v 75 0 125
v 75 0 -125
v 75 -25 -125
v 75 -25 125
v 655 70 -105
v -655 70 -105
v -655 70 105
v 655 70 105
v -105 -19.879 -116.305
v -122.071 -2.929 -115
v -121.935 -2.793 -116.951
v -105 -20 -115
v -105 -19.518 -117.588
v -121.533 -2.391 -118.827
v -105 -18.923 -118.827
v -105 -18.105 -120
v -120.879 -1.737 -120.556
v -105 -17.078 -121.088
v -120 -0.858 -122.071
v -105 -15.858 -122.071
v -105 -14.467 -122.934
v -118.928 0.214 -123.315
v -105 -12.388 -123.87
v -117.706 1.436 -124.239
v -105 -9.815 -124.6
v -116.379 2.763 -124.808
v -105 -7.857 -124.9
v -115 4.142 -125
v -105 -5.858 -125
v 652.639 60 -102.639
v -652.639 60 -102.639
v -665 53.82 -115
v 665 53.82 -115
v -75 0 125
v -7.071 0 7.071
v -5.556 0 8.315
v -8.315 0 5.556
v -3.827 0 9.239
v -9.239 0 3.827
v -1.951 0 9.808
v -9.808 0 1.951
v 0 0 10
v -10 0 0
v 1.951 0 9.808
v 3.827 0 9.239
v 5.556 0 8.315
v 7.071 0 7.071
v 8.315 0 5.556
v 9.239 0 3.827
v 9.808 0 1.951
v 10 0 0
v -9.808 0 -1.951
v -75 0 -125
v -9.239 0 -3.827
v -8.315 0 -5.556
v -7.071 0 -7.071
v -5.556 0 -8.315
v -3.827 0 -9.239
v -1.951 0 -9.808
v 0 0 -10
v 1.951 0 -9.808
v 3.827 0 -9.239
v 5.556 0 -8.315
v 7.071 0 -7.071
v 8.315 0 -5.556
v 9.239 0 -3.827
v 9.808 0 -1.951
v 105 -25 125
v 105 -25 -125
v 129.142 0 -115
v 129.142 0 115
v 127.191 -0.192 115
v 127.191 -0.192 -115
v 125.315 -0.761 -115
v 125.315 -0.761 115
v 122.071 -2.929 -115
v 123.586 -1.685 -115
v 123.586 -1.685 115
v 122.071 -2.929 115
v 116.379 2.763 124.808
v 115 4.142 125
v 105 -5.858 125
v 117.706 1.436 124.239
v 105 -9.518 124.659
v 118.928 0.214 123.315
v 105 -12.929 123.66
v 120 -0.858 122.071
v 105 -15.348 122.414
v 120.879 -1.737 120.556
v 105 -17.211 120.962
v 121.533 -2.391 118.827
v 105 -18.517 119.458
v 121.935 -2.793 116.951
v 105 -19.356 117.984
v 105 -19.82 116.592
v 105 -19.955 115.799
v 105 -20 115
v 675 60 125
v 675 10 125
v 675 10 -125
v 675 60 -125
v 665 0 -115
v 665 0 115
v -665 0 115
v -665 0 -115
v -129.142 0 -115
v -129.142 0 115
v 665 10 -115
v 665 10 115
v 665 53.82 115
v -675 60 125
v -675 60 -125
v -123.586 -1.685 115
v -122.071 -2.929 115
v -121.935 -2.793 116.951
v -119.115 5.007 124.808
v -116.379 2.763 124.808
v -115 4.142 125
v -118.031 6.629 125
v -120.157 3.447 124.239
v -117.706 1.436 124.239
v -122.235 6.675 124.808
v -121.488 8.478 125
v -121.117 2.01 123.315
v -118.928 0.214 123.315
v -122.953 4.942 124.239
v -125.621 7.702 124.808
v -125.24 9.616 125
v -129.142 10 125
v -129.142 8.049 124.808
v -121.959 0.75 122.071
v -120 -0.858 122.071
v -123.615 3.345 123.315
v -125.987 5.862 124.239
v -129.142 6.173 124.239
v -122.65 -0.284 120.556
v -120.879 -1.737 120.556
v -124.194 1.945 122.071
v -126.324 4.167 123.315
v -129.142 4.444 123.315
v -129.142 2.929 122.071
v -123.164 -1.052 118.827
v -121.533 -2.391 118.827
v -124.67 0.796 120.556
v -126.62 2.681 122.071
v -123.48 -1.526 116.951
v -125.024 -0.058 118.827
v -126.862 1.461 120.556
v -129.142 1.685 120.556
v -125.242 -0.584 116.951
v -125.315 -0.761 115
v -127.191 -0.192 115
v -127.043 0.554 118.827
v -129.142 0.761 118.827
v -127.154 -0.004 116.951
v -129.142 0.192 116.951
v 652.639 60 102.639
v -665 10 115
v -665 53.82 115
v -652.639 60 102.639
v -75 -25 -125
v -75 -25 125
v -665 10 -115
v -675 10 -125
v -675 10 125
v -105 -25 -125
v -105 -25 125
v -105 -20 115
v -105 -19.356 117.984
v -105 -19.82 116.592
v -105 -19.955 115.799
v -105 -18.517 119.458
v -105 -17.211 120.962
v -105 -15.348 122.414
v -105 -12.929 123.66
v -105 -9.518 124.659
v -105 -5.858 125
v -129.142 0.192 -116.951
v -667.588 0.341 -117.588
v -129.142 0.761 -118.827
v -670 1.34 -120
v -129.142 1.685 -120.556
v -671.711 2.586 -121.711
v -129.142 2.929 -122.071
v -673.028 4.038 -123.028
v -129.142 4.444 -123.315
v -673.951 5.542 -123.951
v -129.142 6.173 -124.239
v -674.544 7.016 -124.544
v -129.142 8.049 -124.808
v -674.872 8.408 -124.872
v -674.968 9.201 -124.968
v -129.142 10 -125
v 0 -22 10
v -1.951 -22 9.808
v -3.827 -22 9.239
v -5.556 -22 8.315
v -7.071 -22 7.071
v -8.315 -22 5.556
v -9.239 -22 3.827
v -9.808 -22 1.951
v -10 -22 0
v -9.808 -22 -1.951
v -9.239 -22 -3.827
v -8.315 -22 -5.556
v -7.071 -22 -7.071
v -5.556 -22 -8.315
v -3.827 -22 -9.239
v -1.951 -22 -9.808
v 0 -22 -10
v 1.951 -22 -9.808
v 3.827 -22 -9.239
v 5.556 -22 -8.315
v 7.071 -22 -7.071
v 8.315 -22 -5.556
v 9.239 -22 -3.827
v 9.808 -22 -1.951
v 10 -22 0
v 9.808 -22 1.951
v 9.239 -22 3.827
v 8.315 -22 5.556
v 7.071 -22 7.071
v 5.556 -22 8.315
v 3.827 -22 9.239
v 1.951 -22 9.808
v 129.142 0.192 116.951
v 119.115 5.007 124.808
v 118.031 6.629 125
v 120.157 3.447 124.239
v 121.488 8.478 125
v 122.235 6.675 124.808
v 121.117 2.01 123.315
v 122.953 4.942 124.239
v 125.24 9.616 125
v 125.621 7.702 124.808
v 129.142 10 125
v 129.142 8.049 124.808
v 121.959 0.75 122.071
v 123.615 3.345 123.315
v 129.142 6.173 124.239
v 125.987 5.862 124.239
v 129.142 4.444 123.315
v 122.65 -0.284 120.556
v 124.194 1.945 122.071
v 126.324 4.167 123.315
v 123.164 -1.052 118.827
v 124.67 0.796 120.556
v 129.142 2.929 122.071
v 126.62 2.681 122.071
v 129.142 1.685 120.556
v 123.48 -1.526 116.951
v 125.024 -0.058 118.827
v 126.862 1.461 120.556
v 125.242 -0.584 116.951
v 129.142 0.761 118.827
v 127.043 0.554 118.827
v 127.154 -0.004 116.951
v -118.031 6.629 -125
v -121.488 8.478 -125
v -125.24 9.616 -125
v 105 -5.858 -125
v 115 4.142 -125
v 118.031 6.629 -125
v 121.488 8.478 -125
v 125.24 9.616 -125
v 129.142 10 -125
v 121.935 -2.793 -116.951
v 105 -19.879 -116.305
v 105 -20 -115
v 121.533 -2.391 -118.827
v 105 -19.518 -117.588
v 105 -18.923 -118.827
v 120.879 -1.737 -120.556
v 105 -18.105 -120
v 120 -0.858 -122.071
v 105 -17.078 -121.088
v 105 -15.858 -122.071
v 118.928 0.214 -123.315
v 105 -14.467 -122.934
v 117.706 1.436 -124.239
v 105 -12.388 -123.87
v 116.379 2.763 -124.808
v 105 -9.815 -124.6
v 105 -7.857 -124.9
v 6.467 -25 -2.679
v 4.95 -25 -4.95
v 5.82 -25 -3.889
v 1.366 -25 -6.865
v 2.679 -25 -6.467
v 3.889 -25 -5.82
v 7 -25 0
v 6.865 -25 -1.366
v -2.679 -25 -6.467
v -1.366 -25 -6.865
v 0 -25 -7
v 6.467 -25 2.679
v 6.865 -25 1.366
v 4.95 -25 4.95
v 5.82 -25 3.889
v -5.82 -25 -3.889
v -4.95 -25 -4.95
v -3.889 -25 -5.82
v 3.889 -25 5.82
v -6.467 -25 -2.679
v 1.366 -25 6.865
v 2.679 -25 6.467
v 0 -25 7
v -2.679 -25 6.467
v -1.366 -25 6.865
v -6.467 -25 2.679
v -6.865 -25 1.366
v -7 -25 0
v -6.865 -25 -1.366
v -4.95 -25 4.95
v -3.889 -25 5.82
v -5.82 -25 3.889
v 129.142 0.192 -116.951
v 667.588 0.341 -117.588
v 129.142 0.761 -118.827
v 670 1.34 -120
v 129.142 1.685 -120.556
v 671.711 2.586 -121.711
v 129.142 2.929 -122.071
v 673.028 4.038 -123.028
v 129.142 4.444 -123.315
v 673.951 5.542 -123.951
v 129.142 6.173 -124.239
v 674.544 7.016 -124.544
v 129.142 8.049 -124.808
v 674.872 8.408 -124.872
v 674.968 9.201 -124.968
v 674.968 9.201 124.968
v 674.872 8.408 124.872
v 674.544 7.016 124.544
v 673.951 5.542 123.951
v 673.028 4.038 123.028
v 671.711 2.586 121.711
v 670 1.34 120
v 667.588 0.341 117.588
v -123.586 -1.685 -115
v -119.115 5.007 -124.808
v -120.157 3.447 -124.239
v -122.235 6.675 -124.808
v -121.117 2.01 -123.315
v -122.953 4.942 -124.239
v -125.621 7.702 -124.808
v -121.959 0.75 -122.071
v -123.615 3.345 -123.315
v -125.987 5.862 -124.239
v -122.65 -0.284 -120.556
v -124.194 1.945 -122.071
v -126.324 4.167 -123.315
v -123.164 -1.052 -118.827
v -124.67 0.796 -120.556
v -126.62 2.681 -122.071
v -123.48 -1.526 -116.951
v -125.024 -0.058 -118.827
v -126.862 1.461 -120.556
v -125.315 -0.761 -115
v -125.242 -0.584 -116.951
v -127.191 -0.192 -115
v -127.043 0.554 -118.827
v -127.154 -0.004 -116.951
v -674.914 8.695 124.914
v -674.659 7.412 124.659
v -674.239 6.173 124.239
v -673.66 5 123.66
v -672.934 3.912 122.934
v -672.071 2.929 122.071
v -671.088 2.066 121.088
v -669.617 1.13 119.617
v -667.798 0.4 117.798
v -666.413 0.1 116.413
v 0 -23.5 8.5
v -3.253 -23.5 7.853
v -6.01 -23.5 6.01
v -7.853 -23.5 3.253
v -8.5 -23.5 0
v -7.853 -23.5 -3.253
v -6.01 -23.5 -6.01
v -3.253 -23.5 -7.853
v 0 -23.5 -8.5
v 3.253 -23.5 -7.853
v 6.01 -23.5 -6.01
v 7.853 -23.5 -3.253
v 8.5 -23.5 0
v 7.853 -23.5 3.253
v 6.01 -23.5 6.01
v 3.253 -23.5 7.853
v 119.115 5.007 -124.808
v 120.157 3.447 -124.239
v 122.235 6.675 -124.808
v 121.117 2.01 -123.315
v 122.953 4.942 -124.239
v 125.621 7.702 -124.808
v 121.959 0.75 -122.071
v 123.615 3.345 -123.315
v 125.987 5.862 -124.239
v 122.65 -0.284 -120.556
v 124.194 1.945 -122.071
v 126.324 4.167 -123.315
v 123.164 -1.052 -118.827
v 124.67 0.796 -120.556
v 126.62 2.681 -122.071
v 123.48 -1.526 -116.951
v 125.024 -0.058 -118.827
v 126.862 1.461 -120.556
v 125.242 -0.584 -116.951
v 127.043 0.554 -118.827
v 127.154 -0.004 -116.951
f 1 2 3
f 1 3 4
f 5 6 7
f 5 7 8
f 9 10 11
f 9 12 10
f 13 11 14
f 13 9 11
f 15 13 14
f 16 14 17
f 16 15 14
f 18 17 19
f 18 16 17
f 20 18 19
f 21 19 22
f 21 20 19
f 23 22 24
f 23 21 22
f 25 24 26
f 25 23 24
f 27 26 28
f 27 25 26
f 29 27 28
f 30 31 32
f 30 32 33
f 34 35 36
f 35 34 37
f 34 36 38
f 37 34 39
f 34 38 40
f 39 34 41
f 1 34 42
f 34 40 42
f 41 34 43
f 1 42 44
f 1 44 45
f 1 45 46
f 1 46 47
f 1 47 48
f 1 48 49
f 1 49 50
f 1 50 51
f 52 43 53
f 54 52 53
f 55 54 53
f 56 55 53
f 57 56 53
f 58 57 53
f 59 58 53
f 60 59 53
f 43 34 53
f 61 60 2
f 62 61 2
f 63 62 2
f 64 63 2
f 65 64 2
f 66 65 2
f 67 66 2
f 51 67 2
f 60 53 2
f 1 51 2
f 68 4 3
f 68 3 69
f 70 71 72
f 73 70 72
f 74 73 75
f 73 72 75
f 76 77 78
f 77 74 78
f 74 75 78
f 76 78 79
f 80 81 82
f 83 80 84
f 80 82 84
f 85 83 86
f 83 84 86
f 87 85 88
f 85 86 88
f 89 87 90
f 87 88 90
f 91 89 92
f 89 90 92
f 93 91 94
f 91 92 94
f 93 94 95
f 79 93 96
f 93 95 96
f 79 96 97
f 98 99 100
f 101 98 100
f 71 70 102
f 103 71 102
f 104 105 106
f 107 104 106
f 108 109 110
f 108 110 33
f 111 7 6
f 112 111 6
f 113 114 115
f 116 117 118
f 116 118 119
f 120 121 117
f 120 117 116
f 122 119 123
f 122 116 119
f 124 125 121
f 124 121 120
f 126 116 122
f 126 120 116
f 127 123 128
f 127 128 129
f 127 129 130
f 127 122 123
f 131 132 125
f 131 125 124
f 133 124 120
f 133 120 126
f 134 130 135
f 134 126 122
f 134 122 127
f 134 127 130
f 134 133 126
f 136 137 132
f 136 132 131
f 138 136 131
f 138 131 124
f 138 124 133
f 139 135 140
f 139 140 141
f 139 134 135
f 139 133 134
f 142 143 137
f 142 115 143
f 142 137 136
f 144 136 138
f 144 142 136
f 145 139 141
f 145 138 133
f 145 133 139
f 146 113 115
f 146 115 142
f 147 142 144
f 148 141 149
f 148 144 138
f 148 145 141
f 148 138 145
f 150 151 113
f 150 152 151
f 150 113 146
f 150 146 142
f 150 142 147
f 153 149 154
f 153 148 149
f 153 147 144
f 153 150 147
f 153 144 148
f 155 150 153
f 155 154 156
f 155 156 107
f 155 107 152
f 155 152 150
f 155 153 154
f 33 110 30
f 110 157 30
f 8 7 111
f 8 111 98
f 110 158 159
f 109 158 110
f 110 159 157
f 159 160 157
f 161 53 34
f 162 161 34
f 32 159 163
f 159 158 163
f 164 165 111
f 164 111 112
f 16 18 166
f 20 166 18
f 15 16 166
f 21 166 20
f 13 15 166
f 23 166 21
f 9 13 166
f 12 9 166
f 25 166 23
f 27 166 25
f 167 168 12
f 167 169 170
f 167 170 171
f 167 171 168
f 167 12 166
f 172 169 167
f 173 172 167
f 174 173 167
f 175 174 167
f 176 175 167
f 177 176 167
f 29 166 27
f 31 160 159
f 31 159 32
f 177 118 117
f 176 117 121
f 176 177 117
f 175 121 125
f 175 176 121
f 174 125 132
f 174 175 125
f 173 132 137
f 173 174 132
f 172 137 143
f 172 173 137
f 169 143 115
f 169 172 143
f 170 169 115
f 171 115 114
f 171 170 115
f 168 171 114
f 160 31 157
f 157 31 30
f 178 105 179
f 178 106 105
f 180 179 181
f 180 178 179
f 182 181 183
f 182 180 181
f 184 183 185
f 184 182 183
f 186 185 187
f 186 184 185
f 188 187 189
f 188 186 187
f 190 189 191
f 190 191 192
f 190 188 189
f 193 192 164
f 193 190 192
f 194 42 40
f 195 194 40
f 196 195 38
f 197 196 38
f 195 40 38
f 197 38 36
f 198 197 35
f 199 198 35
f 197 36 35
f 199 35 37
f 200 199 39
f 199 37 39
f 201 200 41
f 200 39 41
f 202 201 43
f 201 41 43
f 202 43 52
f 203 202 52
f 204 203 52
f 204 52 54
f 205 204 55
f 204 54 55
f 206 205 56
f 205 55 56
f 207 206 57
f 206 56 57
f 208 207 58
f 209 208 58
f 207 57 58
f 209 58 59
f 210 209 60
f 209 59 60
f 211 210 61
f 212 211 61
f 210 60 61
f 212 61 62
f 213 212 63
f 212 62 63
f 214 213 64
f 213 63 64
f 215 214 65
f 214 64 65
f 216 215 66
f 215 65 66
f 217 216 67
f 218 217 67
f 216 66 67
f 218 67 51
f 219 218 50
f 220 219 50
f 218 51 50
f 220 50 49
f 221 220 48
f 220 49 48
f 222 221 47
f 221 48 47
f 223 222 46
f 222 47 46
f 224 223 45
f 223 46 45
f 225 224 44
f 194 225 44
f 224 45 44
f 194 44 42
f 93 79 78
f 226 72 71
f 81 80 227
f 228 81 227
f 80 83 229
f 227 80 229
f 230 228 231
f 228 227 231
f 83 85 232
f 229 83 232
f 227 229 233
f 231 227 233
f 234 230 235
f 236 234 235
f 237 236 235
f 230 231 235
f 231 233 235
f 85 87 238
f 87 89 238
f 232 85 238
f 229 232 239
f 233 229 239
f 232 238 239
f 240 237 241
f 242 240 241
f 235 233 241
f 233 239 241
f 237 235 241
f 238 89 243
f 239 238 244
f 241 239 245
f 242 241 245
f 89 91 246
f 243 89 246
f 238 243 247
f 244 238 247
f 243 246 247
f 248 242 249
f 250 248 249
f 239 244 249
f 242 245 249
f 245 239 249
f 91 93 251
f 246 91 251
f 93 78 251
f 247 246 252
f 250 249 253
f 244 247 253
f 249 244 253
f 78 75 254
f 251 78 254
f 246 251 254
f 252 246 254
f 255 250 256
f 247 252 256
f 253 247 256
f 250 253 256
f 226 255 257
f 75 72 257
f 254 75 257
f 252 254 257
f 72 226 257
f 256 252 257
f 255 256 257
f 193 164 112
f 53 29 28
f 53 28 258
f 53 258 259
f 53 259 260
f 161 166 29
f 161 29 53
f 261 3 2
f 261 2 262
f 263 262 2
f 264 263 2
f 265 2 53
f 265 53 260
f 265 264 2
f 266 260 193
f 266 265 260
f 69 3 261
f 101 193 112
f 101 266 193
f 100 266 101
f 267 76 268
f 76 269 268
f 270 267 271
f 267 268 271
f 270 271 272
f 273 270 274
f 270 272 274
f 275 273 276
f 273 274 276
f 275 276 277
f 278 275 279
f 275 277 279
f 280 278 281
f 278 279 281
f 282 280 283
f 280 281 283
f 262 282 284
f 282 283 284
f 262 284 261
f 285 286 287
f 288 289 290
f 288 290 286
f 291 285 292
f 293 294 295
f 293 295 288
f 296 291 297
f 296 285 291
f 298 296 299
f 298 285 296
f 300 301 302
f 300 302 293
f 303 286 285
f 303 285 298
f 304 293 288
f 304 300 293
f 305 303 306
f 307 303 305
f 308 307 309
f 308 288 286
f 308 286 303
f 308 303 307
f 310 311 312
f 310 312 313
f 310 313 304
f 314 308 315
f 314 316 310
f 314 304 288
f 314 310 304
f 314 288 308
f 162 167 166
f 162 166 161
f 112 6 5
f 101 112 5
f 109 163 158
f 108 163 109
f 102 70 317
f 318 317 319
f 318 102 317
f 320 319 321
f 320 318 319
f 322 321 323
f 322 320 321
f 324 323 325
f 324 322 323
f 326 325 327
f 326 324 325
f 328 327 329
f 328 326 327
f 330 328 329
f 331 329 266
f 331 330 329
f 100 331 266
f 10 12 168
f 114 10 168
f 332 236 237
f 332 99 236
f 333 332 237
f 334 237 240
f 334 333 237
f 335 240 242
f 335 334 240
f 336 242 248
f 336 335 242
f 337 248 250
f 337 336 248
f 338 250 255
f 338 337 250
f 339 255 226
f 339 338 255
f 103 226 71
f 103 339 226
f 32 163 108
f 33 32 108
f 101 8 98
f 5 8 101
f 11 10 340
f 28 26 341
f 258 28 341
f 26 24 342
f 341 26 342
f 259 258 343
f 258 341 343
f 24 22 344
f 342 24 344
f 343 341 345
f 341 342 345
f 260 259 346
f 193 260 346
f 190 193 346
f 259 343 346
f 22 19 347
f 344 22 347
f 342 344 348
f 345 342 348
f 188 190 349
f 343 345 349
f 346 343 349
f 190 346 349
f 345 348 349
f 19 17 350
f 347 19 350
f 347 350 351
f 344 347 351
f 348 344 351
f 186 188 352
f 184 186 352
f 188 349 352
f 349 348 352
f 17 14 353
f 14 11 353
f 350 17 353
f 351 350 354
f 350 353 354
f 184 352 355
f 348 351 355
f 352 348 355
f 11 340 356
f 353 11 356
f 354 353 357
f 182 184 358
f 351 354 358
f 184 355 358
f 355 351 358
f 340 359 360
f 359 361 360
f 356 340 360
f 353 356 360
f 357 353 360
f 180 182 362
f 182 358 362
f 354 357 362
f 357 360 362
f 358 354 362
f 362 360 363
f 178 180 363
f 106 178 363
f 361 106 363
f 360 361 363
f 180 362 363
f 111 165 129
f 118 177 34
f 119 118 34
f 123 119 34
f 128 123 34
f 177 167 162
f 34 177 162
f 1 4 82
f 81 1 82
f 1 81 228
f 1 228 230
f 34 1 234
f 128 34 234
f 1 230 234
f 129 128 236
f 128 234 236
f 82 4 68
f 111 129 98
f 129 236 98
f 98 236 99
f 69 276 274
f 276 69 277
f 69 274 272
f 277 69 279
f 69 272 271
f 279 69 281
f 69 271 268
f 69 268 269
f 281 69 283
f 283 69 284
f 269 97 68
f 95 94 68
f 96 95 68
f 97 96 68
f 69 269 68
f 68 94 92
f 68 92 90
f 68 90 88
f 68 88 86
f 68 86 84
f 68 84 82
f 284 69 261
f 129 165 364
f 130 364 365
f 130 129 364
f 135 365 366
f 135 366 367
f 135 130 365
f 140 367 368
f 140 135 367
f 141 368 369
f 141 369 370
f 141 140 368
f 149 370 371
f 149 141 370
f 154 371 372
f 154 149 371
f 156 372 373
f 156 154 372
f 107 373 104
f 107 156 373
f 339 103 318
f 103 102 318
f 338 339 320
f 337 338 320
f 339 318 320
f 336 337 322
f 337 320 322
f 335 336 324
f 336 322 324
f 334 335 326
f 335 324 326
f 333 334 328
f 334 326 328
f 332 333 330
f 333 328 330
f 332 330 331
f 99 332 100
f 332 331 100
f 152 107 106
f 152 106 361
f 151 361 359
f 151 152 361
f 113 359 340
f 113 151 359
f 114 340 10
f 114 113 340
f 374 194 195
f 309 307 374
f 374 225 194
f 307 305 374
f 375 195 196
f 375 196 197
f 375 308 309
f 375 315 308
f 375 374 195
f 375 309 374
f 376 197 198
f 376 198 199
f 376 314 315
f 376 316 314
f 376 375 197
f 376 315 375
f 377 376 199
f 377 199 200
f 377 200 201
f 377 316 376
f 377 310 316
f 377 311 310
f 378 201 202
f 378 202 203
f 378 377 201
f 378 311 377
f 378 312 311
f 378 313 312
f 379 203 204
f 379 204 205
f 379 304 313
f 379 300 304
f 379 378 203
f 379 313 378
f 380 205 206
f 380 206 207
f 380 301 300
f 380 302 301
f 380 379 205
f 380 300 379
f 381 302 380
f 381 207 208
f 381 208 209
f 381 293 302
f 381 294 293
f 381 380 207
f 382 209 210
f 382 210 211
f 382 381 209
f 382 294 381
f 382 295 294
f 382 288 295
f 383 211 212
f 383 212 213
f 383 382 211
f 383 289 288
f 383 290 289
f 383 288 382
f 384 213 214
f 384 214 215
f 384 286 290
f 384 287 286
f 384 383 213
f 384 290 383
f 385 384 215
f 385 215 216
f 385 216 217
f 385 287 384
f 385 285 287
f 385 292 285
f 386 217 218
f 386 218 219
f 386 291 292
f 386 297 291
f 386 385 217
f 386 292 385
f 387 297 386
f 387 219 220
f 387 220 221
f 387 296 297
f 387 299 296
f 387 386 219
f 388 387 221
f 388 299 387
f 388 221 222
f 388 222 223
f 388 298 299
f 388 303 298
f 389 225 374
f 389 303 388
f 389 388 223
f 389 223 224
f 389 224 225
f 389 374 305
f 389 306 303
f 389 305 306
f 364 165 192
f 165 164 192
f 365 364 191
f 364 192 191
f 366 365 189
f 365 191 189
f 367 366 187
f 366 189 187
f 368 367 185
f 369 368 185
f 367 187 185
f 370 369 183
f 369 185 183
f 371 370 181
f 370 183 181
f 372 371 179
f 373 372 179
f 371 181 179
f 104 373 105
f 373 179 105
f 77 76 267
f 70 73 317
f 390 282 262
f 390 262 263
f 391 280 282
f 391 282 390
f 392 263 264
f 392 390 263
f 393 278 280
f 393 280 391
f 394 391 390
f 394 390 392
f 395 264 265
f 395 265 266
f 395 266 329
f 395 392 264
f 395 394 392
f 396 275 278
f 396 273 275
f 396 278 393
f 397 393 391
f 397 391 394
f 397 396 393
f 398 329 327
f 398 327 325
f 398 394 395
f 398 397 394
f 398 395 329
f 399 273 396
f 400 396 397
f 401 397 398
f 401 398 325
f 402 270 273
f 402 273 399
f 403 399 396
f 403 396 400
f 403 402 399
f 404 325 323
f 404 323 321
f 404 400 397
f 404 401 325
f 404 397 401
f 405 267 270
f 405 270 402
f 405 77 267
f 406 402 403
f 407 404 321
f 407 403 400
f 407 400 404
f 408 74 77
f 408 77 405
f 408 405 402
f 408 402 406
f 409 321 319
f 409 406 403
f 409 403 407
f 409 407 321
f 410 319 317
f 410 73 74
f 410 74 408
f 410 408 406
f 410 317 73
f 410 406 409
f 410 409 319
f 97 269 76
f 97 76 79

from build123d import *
from OCP.BRepFilletAPI import BRepFilletAPI_MakeChamfer

# Parameters (mm, degrees)
SKETCH1_W           = 1350
SKETCH1_H           = 250
BOSS_EXTRUDE1_DEPTH = 70
CHAMFER1_SIZE       = 10
CHAMFER1_SIZE2      = 20
SHELL1_T            = 10
SKETCH2_W           = 30
SKETCH2_H           = 250
BOSS_EXTRUDE2_DEPTH = 25
CHAMFER2_SIZE       = 20
FILLET1_R           = 10
SKETCH3_R           = 10
BOSS_EXTRUDE3_DEPTH = 25
CHAMFER3_SIZE       = 3


with BuildPart() as part:
    # Sketch1 → Boss-Extrude1 (new body)
    with BuildSketch(Plane(origin=(0, 0, 0), x_dir=(1, 0, 0), z_dir=(0, 1, 0))):
        Rectangle(SKETCH1_W, SKETCH1_H)
    extrude(amount=BOSS_EXTRUDE1_DEPTH)

    # Chamfer1: one chamfer whose edges measure the first distance from different faces: ONE call of the kernel's chamfer builder (chamfer() names one face for all edges)
    chamfer1_edges_1 = [part.edges().sort_by_distance(p)[0] for p in [
        (675, 70, 0),
    ]]
    chamfer1_side_1 = [part.faces().sort_by_distance(p)[0] for p in [
        (675, 35, 0),
    ]]
    chamfer1_edges_2 = [part.edges().sort_by_distance(p)[0] for p in [
        (0, 70, -125),
    ]]
    chamfer1_side_2 = [part.faces().sort_by_distance(p)[0] for p in [
        (0, 35, -125),
    ]]
    chamfer1_edges_3 = [part.edges().sort_by_distance(p)[0] for p in [
        (-675, 70, 0),
    ]]
    chamfer1_side_3 = [part.faces().sort_by_distance(p)[0] for p in [
        (-675, 35, 0),
    ]]
    chamfer1_edges_4 = [part.edges().sort_by_distance(p)[0] for p in [
        (0, 70, 125),
    ]]
    chamfer1_side_4 = [part.faces().sort_by_distance(p)[0] for p in [
        (0, 35, 125),
    ]]
    chamfer1 = BRepFilletAPI_MakeChamfer(part.part.solid().wrapped)
    for e in chamfer1_edges_1:
        chamfer1.Add(CHAMFER1_SIZE, CHAMFER1_SIZE2, e.wrapped, chamfer1_side_1[0].wrapped)  # the first distance lies on this face
    for e in chamfer1_edges_2:
        chamfer1.Add(CHAMFER1_SIZE, CHAMFER1_SIZE2, e.wrapped, chamfer1_side_2[0].wrapped)  # the first distance lies on this face
    for e in chamfer1_edges_3:
        chamfer1.Add(CHAMFER1_SIZE, CHAMFER1_SIZE2, e.wrapped, chamfer1_side_3[0].wrapped)  # the first distance lies on this face
    for e in chamfer1_edges_4:
        chamfer1.Add(CHAMFER1_SIZE, CHAMFER1_SIZE2, e.wrapped, chamfer1_side_4[0].wrapped)  # the first distance lies on this face
    add(Compound.cast(chamfer1.Shape()), mode=Mode.REPLACE)

    # Shell1 (no face opened: a closed hollow body)
    add(offset(amount=-SHELL1_T, mode=Mode.PRIVATE), mode=Mode.SUBTRACT)

    # Sketch2 → Boss-Extrude2 (add)
    with BuildSketch(Plane.XZ):
        with Locations((-90, 0)):
            Rectangle(SKETCH2_W, SKETCH2_H)
        with Locations((90, 0)):
            Rectangle(SKETCH2_W, SKETCH2_H)
    extrude(amount=BOSS_EXTRUDE2_DEPTH)

    # Chamfer2
    chamfer2_edges = [part.edges().sort_by_distance(p)[0] for p in [
        (-105, 0, 0),
        (105, 0, 0),
    ]]
    chamfer(chamfer2_edges, length=CHAMFER2_SIZE)

    # Fillet1
    fillet1_edges = [part.edges().sort_by_distance(p)[0] for p in [
        (-400, 0, -125),
        (675, 0, 0),
        (-400, 0, 125),
        (-675, 0, 0),
        (-125, 0, 0),
        (400, 0, -125),
        (400, 0, 125),
        (125, 0, 0),
        (-115, -10, -125),
        (-115, -10, 125),
        (115, -10, 125),
        (115, -10, -125),
    ]]
    fillet(fillet1_edges, radius=FILLET1_R)

    # Sketch3 → Boss-Extrude3 (add)
    with BuildSketch(Plane.XZ):
        with Locations(Location((0, 0, 0), (0, 0, 90))):
            Circle(SKETCH3_R)
    extrude(amount=BOSS_EXTRUDE3_DEPTH)

    # Chamfer3
    chamfer3_edges = [part.edges().sort_by_distance(p)[0] for p in [
        (0, -25, -10),
    ]]
    chamfer(chamfer3_edges, length=CHAMFER3_SIZE)


solid = part.part
